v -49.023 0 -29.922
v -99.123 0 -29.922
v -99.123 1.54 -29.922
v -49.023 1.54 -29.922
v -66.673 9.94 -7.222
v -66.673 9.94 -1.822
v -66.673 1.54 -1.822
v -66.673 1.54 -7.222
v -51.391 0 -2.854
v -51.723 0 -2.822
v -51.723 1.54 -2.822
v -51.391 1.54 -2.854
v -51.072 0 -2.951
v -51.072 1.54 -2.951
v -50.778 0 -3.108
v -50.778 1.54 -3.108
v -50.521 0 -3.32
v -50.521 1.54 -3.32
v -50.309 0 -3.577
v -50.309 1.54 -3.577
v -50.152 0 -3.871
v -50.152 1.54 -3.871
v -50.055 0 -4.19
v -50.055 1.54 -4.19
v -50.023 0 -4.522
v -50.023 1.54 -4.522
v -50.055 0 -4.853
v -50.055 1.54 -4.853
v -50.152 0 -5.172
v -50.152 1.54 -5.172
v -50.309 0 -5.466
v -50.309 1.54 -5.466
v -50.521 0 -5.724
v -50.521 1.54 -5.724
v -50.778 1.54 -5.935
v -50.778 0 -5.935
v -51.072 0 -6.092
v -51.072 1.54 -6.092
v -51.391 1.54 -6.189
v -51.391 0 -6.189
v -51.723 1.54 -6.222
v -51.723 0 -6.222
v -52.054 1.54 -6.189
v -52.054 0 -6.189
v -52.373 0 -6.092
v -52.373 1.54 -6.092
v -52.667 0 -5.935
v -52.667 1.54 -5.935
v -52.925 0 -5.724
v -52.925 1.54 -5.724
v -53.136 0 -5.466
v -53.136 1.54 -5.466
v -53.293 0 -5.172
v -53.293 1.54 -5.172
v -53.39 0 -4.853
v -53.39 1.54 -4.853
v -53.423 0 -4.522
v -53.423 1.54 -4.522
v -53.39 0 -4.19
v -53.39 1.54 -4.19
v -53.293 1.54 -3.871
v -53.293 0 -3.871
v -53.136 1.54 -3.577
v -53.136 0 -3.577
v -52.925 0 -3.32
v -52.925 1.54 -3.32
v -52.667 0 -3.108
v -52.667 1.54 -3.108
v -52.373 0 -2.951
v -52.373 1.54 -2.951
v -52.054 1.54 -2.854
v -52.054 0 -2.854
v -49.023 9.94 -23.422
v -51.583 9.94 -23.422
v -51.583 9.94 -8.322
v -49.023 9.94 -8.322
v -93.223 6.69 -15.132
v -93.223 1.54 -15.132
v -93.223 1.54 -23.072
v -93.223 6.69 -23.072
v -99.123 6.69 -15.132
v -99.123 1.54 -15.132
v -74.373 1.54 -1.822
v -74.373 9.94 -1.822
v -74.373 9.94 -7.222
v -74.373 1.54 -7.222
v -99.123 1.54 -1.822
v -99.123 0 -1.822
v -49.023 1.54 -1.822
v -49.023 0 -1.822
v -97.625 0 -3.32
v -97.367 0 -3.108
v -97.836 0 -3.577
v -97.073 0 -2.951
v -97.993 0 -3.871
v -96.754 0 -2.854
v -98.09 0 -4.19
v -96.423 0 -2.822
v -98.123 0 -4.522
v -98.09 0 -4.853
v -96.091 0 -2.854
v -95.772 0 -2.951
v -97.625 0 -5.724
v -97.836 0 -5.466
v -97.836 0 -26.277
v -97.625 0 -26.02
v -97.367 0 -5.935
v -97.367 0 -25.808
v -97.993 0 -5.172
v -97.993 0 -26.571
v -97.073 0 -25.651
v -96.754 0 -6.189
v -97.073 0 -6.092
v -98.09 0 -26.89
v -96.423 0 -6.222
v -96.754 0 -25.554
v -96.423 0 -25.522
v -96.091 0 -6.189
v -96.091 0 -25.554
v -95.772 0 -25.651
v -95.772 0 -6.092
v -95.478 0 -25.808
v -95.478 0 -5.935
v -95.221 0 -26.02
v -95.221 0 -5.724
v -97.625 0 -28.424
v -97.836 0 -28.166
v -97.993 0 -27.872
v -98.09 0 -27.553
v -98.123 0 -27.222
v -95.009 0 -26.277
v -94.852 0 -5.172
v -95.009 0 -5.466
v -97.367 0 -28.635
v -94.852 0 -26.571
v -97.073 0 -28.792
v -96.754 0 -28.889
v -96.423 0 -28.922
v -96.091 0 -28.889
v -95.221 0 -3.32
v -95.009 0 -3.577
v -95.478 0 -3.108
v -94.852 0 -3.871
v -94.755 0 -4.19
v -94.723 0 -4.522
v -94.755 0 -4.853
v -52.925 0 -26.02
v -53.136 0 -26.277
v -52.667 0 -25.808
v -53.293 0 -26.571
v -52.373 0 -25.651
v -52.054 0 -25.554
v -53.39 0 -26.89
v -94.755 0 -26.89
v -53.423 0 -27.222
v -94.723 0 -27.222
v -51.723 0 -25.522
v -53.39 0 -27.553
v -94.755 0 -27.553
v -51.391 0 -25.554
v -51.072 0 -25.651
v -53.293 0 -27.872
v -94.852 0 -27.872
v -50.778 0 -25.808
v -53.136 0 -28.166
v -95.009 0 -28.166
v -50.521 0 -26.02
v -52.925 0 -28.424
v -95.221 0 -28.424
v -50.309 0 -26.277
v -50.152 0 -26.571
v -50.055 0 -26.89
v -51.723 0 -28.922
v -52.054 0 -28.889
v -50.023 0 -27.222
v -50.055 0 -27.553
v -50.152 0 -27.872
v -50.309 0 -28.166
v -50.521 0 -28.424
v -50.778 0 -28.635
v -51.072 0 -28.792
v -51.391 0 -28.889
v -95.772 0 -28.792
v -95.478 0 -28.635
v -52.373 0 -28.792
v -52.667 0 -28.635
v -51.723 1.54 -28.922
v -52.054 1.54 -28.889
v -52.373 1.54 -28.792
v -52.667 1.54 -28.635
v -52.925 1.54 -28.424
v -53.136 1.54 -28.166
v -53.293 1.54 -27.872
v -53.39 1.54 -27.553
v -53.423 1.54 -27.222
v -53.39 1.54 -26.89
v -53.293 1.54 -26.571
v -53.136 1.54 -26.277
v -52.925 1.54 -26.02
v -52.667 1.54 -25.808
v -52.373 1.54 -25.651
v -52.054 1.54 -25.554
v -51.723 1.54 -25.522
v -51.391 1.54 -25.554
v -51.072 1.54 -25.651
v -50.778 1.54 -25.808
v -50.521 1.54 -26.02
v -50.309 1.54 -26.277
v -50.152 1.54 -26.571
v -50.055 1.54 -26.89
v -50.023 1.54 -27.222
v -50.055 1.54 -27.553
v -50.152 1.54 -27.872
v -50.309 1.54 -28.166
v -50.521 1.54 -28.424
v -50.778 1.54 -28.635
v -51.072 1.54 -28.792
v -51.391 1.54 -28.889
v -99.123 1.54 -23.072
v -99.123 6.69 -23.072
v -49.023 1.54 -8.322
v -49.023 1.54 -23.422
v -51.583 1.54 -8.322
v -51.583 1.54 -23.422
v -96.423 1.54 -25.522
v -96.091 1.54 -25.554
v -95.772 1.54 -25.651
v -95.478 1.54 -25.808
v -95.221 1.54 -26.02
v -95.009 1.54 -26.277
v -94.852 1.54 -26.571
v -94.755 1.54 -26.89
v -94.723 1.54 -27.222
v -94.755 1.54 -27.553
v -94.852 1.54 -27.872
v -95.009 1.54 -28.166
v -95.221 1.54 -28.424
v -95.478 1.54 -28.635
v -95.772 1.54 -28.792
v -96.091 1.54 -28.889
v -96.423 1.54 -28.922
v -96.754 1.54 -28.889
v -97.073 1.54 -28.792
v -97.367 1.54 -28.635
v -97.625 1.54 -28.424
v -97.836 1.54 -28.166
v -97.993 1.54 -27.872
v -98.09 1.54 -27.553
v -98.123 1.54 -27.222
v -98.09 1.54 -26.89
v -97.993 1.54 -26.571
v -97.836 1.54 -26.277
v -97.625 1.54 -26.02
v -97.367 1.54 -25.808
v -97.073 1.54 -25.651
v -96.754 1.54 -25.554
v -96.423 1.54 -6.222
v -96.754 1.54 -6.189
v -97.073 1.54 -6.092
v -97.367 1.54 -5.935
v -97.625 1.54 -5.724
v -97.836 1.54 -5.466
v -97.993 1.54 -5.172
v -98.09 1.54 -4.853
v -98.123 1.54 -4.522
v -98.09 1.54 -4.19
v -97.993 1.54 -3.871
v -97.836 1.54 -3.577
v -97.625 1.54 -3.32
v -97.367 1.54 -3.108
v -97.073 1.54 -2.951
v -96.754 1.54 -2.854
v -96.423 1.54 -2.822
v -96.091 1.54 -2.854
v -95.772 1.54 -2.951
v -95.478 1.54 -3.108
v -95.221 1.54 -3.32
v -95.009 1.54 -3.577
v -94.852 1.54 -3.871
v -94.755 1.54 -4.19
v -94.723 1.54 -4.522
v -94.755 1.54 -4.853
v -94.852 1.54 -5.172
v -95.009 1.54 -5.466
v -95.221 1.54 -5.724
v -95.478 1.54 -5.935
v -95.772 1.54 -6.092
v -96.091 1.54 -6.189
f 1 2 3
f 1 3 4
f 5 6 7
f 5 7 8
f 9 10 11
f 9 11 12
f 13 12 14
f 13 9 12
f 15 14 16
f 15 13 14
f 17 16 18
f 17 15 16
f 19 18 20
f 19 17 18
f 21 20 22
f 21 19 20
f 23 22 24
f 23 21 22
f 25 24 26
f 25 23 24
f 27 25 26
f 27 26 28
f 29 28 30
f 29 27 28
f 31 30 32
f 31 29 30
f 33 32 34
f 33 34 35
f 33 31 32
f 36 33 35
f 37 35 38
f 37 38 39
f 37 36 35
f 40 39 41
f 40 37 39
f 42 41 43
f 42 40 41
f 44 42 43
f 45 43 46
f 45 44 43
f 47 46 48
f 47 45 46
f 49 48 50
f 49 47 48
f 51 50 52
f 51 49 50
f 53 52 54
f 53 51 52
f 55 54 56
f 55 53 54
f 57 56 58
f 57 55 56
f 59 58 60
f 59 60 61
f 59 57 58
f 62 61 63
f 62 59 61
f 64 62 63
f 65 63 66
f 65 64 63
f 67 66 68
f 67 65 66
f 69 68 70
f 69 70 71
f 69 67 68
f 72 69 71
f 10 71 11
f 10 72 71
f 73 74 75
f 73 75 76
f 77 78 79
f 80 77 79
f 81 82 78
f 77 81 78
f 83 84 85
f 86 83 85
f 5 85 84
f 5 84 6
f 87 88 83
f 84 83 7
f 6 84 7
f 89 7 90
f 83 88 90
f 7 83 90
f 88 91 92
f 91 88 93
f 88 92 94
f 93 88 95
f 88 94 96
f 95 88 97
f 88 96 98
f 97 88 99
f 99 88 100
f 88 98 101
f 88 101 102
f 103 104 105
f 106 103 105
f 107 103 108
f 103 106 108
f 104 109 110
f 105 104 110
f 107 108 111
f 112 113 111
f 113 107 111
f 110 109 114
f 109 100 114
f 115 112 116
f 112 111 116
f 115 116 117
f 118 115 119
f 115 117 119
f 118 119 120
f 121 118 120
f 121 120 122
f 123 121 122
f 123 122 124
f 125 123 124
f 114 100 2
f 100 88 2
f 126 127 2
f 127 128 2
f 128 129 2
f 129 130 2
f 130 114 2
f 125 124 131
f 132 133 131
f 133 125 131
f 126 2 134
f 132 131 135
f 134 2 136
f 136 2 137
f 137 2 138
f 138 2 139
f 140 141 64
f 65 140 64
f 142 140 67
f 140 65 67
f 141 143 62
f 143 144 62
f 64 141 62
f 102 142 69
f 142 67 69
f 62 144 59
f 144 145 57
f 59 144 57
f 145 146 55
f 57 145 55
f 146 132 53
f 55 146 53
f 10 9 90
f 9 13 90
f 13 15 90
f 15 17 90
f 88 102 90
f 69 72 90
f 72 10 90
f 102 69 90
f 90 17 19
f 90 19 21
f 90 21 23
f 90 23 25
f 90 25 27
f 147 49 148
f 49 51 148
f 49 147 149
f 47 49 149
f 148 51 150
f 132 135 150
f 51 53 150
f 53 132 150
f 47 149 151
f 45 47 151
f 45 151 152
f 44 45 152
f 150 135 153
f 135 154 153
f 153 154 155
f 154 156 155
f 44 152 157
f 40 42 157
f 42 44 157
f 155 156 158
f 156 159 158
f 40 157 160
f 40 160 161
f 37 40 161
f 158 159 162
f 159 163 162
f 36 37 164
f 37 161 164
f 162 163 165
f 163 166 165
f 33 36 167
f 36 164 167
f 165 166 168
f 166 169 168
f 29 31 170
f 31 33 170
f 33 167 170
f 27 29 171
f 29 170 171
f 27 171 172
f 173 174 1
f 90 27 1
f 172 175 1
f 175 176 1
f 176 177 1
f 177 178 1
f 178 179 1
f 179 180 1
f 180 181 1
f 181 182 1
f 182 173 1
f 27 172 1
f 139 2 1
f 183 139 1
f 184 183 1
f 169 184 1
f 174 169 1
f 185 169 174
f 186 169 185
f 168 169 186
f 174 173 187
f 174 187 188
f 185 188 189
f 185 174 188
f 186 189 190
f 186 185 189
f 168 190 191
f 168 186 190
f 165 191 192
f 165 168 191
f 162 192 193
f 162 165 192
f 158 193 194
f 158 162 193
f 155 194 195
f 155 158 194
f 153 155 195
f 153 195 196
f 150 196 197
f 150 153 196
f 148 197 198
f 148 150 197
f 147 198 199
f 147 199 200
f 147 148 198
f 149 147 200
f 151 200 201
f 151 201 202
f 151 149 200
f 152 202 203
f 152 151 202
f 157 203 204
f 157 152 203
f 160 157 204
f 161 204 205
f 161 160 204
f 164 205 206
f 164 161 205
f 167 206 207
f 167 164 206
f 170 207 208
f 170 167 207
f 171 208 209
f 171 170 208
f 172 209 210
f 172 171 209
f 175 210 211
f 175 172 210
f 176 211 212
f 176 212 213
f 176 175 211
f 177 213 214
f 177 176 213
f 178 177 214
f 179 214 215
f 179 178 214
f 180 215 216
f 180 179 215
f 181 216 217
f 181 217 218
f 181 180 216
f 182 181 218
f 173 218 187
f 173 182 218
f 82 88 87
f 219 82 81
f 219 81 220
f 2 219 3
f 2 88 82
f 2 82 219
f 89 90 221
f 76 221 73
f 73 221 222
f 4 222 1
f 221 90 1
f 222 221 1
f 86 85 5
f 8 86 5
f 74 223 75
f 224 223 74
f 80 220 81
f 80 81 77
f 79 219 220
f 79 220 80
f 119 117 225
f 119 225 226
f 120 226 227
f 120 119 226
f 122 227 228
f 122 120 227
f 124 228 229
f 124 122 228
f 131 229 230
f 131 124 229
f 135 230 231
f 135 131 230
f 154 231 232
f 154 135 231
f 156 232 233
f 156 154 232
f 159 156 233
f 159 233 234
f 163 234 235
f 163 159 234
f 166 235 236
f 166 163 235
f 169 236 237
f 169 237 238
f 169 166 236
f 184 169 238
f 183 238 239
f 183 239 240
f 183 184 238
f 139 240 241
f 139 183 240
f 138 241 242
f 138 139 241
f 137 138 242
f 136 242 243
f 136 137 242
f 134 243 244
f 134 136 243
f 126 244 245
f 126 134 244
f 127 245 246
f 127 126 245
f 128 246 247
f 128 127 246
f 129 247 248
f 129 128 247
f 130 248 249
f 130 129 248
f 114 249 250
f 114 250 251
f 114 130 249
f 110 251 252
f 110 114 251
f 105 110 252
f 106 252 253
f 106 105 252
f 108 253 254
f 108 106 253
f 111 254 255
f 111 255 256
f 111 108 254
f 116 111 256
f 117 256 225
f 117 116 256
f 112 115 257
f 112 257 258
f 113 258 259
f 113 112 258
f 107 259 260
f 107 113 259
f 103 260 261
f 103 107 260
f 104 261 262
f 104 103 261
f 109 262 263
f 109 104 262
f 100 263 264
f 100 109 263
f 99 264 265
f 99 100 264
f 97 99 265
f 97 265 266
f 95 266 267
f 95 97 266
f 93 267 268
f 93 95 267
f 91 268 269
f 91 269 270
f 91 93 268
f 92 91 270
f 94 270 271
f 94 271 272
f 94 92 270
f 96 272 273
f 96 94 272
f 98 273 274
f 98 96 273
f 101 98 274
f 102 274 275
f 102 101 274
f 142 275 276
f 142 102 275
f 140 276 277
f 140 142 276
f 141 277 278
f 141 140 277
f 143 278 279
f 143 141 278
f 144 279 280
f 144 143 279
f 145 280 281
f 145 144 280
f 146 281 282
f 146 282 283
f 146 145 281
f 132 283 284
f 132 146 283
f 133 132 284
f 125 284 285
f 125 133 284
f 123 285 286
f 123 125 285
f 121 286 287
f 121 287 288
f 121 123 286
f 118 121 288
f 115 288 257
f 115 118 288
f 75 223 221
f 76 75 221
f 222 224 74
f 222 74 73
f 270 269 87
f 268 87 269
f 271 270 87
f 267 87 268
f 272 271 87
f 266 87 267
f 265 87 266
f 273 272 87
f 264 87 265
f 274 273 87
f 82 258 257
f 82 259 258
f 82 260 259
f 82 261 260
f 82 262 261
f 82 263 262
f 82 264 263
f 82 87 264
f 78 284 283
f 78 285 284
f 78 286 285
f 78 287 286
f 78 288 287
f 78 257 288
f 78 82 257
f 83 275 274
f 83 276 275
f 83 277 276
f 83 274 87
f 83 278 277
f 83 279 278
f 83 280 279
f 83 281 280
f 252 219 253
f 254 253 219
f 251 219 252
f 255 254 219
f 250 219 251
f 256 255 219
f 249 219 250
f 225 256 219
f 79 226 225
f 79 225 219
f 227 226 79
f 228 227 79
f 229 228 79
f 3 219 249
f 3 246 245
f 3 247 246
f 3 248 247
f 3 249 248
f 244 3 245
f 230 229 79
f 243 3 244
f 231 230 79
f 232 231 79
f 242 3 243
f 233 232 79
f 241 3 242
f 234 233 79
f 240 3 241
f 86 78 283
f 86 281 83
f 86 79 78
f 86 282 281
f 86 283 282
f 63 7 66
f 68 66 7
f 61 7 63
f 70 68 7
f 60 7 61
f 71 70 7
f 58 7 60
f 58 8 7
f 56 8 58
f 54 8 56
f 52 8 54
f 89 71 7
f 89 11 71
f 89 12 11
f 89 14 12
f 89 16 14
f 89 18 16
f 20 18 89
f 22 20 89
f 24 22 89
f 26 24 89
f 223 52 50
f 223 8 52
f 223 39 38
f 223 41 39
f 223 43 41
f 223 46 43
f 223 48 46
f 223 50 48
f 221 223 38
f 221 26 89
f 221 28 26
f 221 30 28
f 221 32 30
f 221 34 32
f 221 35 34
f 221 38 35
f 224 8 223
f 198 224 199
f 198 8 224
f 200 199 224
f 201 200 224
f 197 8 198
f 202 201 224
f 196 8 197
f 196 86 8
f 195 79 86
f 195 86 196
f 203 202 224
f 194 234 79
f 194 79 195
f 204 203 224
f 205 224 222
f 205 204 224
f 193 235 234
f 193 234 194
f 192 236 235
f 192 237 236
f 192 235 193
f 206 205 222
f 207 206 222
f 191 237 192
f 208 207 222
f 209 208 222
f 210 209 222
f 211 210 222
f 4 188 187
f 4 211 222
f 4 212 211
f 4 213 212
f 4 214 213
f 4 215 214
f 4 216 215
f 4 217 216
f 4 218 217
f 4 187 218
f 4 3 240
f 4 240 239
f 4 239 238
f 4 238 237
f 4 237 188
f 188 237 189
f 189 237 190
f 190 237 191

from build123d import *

# Parameters (mm, degrees)
SKETCH1_W      = 50.1
SKETCH1_H      = 28.1
SKETCH1_R      = 1.7
EXTRUDE1_DEPTH = 1.54
SKETCH2_W      = 2.56
SKETCH2_H      = 15.1
SKETCH2_W_2    = 7.7
SKETCH2_H_2    = 5.4
EXTRUDE3_DEPTH = 8.4
SKETCH3_W      = 5.9
SKETCH3_H      = 7.94
EXTRUDE4_DEPTH = 5.15


with BuildPart() as part:
    # Sketch1 → Extrude1 (new body)
    with BuildSketch(Plane(origin=(0, 0, 0), x_dir=(1, 0, 0), z_dir=(0, 1, 0))):
        with Locations((-74.07266419, 15.871623192)):
            Rectangle(SKETCH1_W, SKETCH1_H)
        with Locations(Location((-96.42266419, 27.221623192, 0), (0, 0, 270))):
            Circle(SKETCH1_R, mode=Mode.SUBTRACT)
        with Locations(Location((-51.72266419, 27.221623192, 0), (0, 0, 90))):
            Circle(SKETCH1_R, mode=Mode.SUBTRACT)
        with Locations(Location((-51.72266419, 4.521623192, 0), (0, 0, 270))):
            Circle(SKETCH1_R, mode=Mode.SUBTRACT)
        with Locations(Location((-96.42266419, 4.521623192, 0), (0, 0, 90))):
            Circle(SKETCH1_R, mode=Mode.SUBTRACT)
    extrude(amount=EXTRUDE1_DEPTH)

    # Sketch2 → Extrude3 (add)
    with BuildSketch(Plane(origin=(0, 1.54, 0), x_dir=(1, 0, 0), z_dir=(0, 1, 0))):
        with Locations((-50.30266419, 15.871623192)):
            Rectangle(SKETCH2_W, SKETCH2_H)
        with Locations((-70.52266419, 4.521623192)):
            Rectangle(SKETCH2_W_2, SKETCH2_H_2)
    extrude(amount=EXTRUDE3_DEPTH)

    # Sketch3 → Extrude4 (add)
    with BuildSketch(Plane(origin=(0, 1.54, 0), x_dir=(1, 0, 0), z_dir=(0, 1, 0))):
        with Locations((-96.17266419, 19.101623192)):
            Rectangle(SKETCH3_W, SKETCH3_H)
    extrude(amount=EXTRUDE4_DEPTH)


solid = part.part
